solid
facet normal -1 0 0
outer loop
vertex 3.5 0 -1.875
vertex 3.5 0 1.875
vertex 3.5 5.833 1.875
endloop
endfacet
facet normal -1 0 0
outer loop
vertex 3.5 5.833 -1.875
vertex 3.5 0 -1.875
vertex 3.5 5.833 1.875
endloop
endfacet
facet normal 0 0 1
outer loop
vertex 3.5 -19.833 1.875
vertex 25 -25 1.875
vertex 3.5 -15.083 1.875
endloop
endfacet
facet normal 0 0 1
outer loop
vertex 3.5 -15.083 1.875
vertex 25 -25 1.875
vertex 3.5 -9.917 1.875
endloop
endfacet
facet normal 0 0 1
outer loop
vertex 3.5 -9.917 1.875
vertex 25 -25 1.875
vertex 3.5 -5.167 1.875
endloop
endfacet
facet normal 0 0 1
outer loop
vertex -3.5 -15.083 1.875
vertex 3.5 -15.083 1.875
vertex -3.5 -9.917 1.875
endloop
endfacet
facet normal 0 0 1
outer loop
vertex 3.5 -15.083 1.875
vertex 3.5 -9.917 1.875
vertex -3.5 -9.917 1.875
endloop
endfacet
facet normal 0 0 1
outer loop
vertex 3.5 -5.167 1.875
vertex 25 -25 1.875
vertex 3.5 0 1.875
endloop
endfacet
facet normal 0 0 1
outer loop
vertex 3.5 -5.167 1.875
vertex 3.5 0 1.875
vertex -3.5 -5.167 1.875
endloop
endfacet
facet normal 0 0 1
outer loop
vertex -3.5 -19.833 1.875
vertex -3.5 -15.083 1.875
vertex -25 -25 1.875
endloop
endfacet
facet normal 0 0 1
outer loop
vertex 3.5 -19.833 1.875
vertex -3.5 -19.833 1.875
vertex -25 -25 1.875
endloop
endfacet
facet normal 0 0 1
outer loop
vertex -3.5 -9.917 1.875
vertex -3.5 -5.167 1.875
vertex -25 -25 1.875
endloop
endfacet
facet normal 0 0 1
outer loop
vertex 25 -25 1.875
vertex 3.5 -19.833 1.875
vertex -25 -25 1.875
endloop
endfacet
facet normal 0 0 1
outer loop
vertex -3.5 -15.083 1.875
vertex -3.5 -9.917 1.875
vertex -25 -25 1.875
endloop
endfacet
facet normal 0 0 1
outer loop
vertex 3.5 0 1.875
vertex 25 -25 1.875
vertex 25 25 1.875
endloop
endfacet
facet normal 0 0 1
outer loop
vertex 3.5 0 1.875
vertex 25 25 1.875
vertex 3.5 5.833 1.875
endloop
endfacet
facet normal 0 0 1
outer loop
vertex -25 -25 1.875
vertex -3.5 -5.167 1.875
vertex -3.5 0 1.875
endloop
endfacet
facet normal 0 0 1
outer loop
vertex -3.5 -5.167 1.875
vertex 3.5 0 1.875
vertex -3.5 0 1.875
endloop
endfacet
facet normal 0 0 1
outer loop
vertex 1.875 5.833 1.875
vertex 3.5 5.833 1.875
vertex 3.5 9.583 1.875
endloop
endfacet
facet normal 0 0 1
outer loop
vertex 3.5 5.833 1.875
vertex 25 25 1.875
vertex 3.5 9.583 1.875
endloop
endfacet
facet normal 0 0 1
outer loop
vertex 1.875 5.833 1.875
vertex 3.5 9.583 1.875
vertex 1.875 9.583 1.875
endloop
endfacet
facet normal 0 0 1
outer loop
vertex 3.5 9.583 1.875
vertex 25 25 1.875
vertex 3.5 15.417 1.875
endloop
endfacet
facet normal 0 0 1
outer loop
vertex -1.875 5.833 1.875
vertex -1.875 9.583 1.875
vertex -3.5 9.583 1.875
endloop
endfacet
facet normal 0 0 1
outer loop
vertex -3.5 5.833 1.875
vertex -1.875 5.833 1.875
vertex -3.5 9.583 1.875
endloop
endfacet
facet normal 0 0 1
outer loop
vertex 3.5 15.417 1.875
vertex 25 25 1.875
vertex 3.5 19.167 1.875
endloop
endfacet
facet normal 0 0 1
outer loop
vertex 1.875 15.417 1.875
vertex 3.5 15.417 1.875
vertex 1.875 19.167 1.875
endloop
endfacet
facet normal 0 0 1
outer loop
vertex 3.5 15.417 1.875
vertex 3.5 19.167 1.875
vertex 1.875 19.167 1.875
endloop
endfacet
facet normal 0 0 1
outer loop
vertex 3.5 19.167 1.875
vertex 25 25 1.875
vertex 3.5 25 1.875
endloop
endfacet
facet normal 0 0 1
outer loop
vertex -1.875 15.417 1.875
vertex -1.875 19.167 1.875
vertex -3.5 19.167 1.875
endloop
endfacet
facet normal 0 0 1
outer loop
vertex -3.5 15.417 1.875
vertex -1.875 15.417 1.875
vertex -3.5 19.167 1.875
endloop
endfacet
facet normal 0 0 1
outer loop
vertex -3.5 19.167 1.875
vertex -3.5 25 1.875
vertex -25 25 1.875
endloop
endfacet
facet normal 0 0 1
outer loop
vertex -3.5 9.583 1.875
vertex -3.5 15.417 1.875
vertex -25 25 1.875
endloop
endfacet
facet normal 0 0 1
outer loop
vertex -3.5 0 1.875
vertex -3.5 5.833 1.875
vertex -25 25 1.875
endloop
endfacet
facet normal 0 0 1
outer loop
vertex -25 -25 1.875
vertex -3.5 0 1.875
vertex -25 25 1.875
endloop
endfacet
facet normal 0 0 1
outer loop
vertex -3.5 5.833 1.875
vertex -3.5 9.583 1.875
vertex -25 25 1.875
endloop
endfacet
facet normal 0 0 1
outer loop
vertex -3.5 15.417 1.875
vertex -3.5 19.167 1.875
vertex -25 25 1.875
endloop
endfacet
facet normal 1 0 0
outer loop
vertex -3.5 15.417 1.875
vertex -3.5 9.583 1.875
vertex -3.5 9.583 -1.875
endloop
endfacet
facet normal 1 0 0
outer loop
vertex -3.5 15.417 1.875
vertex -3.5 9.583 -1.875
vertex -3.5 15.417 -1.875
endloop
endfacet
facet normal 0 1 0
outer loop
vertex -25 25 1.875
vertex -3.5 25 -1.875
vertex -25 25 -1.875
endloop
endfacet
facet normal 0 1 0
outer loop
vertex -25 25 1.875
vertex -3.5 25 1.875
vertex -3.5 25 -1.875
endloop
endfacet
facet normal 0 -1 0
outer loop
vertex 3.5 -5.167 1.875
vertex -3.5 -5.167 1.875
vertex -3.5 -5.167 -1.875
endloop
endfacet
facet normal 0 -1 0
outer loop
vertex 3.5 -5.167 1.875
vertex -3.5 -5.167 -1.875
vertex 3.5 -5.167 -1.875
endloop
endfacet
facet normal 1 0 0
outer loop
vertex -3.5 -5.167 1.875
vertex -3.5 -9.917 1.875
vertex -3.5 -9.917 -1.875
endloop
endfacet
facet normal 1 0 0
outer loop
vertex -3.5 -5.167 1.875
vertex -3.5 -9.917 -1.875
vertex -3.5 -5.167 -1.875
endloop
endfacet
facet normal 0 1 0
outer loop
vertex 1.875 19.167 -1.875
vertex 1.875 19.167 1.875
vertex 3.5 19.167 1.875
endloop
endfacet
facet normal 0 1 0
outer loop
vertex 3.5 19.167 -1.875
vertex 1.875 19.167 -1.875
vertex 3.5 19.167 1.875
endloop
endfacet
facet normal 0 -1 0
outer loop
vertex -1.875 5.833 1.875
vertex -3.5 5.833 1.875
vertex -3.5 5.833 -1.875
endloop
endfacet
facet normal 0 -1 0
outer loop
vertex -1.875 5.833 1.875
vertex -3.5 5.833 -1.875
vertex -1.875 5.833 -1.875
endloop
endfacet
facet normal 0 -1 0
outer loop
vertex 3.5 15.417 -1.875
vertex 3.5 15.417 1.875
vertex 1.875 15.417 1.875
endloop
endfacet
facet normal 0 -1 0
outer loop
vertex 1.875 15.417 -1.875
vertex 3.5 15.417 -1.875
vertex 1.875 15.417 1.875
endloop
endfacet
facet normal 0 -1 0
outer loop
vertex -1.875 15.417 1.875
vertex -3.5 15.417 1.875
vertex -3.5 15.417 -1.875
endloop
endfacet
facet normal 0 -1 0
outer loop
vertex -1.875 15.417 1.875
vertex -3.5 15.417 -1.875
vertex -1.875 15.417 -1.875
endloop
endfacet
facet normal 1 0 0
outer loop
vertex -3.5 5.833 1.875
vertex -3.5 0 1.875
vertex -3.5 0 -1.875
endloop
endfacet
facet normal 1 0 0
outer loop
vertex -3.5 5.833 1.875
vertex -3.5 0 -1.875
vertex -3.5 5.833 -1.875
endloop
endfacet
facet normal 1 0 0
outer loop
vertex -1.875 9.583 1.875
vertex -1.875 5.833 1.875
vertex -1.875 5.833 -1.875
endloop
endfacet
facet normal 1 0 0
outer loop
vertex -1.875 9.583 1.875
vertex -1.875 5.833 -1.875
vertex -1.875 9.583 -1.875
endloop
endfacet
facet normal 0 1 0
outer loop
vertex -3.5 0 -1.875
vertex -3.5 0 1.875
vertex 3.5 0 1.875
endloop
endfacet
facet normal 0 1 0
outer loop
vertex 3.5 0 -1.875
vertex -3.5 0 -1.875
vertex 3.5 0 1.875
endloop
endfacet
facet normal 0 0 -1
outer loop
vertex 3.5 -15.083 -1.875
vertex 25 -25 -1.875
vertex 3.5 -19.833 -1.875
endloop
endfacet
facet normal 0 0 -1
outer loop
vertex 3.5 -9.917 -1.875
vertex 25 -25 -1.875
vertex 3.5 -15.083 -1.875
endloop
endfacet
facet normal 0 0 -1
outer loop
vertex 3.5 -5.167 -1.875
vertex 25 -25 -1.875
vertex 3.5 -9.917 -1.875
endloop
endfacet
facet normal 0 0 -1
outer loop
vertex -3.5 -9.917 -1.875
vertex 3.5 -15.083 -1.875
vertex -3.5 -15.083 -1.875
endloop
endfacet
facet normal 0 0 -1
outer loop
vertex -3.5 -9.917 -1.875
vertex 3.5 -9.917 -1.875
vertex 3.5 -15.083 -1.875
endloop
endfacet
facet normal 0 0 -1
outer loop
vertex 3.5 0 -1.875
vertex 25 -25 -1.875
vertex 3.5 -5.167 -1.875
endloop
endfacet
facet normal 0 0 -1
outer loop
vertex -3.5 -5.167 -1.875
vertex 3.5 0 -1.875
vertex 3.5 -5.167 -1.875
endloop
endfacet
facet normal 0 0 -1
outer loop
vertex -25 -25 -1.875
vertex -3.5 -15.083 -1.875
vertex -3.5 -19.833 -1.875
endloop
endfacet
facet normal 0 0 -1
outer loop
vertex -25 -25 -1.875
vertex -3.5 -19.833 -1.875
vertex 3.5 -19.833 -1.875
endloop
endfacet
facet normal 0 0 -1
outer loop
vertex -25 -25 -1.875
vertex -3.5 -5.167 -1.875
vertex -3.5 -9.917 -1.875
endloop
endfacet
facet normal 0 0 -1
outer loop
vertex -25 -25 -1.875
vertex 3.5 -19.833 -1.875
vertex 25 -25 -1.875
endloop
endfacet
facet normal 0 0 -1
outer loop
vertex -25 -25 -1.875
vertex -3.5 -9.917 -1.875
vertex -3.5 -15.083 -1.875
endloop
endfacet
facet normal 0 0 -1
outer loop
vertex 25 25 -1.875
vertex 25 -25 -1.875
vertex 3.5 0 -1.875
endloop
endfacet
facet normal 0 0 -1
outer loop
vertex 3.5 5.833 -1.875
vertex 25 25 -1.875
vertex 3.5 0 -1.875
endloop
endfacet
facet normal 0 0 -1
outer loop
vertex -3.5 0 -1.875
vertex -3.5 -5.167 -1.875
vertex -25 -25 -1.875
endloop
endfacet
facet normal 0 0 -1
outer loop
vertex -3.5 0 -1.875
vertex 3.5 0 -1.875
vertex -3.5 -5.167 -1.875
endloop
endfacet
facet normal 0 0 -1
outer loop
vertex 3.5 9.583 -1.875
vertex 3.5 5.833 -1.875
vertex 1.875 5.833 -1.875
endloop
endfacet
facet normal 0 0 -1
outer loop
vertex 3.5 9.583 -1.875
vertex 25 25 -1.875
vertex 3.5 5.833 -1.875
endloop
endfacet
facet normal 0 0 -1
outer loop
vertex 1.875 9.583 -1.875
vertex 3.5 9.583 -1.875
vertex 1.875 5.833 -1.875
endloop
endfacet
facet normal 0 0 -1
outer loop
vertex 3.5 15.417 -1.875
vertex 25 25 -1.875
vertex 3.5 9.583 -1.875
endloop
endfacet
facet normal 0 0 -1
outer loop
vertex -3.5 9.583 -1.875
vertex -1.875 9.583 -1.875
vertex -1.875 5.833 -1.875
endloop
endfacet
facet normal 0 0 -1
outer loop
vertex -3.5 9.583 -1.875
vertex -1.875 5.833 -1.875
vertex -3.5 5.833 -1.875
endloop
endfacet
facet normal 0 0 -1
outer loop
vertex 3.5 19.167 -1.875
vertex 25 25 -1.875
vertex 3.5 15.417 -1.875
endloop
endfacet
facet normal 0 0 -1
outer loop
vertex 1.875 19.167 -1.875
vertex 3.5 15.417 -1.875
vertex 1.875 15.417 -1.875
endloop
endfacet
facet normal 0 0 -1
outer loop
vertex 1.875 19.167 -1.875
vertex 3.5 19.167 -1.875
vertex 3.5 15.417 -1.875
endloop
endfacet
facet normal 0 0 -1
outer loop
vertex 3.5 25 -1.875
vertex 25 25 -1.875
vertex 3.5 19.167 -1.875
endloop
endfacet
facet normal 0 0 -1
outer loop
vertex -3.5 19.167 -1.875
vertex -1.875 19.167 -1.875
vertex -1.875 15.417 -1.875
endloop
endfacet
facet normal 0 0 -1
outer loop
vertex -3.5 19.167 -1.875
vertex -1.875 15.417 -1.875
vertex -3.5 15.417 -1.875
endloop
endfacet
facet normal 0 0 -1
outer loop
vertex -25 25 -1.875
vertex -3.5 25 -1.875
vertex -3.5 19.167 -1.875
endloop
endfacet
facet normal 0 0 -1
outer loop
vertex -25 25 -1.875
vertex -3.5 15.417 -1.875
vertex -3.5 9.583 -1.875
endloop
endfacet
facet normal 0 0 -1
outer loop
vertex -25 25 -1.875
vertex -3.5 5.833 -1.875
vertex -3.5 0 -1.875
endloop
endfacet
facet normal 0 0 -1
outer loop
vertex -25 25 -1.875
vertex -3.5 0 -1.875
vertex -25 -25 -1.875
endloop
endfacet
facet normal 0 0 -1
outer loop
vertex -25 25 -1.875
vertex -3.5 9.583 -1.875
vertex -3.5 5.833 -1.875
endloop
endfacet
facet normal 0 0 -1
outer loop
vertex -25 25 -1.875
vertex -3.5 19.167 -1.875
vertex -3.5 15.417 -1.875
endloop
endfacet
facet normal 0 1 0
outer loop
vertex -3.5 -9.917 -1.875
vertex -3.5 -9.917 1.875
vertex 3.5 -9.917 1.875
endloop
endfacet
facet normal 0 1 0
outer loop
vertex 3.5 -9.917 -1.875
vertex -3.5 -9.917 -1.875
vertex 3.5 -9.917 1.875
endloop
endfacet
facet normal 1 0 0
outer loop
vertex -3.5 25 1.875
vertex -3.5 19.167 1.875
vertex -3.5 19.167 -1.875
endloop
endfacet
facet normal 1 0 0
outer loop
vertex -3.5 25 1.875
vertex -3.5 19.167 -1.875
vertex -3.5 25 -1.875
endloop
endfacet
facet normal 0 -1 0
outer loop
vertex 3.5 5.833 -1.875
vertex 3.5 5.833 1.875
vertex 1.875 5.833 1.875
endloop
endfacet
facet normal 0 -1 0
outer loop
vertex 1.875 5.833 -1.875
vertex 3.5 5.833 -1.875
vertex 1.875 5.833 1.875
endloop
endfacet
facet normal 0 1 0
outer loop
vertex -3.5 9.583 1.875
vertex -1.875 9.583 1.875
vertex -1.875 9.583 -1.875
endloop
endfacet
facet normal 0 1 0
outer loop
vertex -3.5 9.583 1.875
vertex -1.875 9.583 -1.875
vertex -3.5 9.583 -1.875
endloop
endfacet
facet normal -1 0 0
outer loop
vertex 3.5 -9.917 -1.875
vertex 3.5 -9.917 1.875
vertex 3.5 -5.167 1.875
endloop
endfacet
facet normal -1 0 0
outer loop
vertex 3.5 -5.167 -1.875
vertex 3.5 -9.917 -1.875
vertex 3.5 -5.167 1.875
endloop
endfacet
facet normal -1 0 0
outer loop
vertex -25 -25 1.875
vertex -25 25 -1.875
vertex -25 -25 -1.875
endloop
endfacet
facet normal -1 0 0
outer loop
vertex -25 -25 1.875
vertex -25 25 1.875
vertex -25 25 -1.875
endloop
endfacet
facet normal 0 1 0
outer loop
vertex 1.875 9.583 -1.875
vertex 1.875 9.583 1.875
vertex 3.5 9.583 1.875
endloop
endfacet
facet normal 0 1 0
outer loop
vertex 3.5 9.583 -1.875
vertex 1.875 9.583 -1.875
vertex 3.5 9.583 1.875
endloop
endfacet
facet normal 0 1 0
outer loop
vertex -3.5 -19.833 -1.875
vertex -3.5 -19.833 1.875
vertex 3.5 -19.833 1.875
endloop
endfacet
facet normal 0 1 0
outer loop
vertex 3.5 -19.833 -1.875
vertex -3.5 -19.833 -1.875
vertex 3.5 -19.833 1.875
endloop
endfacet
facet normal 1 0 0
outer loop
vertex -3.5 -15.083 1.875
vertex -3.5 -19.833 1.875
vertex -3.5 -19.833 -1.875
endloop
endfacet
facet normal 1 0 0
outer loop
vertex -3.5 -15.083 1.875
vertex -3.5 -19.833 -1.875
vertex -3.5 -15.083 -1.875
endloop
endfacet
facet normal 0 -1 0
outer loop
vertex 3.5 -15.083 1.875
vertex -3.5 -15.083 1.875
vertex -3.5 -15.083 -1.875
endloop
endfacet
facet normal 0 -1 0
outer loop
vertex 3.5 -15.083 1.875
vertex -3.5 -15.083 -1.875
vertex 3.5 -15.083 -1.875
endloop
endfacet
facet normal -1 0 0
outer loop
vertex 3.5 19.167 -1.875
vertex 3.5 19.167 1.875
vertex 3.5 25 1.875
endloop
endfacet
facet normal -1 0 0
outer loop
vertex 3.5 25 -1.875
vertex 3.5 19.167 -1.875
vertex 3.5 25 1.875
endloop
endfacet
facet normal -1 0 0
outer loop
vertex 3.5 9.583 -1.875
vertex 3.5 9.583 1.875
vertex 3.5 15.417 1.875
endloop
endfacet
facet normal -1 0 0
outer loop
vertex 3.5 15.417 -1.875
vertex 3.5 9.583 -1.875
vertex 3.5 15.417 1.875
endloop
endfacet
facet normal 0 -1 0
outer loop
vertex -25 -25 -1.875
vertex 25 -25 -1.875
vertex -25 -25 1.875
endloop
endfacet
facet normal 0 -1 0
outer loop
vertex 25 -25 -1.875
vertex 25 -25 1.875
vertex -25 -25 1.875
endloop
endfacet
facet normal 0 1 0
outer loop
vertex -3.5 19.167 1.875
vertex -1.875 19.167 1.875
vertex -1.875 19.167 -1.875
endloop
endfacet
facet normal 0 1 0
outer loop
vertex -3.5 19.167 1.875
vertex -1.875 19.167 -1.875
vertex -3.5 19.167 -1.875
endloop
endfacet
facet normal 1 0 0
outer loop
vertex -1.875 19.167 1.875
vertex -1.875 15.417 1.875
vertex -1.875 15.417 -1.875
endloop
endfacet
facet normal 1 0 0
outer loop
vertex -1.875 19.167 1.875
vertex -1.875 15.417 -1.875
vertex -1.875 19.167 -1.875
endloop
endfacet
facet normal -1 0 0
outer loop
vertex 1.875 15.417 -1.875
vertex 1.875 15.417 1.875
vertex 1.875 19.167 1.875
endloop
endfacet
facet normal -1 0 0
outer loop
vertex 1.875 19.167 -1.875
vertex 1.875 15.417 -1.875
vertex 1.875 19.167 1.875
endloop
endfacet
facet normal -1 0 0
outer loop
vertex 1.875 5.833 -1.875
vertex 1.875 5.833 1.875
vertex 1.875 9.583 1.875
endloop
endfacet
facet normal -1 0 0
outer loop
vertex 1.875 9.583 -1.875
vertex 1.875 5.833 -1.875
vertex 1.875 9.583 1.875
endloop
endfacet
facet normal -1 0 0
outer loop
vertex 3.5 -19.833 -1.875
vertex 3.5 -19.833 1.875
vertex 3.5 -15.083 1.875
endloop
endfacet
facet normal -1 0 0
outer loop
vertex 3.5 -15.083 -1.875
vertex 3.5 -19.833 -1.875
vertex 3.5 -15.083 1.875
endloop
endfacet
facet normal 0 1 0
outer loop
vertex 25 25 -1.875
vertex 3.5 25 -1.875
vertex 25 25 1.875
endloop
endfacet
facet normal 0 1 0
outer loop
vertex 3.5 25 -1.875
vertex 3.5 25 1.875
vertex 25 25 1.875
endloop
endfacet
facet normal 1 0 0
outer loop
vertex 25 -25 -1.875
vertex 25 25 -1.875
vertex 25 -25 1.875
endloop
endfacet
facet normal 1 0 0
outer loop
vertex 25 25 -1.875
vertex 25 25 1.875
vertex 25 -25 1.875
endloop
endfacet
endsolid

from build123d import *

# Parameters (mm, degrees)
F2_DEPTH = 1.875
F4_W     = 7
F4_H     = 4.75
F5_DEPTH = 25


with BuildPart() as f2:
    # F1 (on Top) → F2 (new body, symmetric)
    with BuildSketch(Plane.XY):
        Polygon((-25, -25), (0, -25), (0, 0), (-3.5, 0), (-3.5, 5.8333333333), (-1.875, 5.8333333333), (-1.875, 9.5833333333), (-3.5, 9.5833333333), (-3.5, 15.4166666667), (-1.875, 15.4166666667), (-1.875, 19.1666666667), (-3.5, 19.1666666667), (-3.5, 25), (-25, 25), align=None)
    extrude(amount=F2_DEPTH, both=True)

    # F3: F2 across face


with BuildPart() as f2_1:
    add(f2.part)
    add(f2.part.mirror(Plane(origin=(0, -12.5, 0), x_dir=(0, 1, 0), z_dir=(1, 0, 0))))

    # F4 (on face) → F5 (cut)
    with BuildSketch(Plane.XY.offset(1.875)):
        with Locations((0, -7.5416666667)):
            Rectangle(F4_W, F4_H)
        with Locations((0, -17.4583333333)):
            Rectangle(F4_W, F4_H)
    extrude(amount=-F5_DEPTH, mode=Mode.SUBTRACT)


solid = f2_1.part
